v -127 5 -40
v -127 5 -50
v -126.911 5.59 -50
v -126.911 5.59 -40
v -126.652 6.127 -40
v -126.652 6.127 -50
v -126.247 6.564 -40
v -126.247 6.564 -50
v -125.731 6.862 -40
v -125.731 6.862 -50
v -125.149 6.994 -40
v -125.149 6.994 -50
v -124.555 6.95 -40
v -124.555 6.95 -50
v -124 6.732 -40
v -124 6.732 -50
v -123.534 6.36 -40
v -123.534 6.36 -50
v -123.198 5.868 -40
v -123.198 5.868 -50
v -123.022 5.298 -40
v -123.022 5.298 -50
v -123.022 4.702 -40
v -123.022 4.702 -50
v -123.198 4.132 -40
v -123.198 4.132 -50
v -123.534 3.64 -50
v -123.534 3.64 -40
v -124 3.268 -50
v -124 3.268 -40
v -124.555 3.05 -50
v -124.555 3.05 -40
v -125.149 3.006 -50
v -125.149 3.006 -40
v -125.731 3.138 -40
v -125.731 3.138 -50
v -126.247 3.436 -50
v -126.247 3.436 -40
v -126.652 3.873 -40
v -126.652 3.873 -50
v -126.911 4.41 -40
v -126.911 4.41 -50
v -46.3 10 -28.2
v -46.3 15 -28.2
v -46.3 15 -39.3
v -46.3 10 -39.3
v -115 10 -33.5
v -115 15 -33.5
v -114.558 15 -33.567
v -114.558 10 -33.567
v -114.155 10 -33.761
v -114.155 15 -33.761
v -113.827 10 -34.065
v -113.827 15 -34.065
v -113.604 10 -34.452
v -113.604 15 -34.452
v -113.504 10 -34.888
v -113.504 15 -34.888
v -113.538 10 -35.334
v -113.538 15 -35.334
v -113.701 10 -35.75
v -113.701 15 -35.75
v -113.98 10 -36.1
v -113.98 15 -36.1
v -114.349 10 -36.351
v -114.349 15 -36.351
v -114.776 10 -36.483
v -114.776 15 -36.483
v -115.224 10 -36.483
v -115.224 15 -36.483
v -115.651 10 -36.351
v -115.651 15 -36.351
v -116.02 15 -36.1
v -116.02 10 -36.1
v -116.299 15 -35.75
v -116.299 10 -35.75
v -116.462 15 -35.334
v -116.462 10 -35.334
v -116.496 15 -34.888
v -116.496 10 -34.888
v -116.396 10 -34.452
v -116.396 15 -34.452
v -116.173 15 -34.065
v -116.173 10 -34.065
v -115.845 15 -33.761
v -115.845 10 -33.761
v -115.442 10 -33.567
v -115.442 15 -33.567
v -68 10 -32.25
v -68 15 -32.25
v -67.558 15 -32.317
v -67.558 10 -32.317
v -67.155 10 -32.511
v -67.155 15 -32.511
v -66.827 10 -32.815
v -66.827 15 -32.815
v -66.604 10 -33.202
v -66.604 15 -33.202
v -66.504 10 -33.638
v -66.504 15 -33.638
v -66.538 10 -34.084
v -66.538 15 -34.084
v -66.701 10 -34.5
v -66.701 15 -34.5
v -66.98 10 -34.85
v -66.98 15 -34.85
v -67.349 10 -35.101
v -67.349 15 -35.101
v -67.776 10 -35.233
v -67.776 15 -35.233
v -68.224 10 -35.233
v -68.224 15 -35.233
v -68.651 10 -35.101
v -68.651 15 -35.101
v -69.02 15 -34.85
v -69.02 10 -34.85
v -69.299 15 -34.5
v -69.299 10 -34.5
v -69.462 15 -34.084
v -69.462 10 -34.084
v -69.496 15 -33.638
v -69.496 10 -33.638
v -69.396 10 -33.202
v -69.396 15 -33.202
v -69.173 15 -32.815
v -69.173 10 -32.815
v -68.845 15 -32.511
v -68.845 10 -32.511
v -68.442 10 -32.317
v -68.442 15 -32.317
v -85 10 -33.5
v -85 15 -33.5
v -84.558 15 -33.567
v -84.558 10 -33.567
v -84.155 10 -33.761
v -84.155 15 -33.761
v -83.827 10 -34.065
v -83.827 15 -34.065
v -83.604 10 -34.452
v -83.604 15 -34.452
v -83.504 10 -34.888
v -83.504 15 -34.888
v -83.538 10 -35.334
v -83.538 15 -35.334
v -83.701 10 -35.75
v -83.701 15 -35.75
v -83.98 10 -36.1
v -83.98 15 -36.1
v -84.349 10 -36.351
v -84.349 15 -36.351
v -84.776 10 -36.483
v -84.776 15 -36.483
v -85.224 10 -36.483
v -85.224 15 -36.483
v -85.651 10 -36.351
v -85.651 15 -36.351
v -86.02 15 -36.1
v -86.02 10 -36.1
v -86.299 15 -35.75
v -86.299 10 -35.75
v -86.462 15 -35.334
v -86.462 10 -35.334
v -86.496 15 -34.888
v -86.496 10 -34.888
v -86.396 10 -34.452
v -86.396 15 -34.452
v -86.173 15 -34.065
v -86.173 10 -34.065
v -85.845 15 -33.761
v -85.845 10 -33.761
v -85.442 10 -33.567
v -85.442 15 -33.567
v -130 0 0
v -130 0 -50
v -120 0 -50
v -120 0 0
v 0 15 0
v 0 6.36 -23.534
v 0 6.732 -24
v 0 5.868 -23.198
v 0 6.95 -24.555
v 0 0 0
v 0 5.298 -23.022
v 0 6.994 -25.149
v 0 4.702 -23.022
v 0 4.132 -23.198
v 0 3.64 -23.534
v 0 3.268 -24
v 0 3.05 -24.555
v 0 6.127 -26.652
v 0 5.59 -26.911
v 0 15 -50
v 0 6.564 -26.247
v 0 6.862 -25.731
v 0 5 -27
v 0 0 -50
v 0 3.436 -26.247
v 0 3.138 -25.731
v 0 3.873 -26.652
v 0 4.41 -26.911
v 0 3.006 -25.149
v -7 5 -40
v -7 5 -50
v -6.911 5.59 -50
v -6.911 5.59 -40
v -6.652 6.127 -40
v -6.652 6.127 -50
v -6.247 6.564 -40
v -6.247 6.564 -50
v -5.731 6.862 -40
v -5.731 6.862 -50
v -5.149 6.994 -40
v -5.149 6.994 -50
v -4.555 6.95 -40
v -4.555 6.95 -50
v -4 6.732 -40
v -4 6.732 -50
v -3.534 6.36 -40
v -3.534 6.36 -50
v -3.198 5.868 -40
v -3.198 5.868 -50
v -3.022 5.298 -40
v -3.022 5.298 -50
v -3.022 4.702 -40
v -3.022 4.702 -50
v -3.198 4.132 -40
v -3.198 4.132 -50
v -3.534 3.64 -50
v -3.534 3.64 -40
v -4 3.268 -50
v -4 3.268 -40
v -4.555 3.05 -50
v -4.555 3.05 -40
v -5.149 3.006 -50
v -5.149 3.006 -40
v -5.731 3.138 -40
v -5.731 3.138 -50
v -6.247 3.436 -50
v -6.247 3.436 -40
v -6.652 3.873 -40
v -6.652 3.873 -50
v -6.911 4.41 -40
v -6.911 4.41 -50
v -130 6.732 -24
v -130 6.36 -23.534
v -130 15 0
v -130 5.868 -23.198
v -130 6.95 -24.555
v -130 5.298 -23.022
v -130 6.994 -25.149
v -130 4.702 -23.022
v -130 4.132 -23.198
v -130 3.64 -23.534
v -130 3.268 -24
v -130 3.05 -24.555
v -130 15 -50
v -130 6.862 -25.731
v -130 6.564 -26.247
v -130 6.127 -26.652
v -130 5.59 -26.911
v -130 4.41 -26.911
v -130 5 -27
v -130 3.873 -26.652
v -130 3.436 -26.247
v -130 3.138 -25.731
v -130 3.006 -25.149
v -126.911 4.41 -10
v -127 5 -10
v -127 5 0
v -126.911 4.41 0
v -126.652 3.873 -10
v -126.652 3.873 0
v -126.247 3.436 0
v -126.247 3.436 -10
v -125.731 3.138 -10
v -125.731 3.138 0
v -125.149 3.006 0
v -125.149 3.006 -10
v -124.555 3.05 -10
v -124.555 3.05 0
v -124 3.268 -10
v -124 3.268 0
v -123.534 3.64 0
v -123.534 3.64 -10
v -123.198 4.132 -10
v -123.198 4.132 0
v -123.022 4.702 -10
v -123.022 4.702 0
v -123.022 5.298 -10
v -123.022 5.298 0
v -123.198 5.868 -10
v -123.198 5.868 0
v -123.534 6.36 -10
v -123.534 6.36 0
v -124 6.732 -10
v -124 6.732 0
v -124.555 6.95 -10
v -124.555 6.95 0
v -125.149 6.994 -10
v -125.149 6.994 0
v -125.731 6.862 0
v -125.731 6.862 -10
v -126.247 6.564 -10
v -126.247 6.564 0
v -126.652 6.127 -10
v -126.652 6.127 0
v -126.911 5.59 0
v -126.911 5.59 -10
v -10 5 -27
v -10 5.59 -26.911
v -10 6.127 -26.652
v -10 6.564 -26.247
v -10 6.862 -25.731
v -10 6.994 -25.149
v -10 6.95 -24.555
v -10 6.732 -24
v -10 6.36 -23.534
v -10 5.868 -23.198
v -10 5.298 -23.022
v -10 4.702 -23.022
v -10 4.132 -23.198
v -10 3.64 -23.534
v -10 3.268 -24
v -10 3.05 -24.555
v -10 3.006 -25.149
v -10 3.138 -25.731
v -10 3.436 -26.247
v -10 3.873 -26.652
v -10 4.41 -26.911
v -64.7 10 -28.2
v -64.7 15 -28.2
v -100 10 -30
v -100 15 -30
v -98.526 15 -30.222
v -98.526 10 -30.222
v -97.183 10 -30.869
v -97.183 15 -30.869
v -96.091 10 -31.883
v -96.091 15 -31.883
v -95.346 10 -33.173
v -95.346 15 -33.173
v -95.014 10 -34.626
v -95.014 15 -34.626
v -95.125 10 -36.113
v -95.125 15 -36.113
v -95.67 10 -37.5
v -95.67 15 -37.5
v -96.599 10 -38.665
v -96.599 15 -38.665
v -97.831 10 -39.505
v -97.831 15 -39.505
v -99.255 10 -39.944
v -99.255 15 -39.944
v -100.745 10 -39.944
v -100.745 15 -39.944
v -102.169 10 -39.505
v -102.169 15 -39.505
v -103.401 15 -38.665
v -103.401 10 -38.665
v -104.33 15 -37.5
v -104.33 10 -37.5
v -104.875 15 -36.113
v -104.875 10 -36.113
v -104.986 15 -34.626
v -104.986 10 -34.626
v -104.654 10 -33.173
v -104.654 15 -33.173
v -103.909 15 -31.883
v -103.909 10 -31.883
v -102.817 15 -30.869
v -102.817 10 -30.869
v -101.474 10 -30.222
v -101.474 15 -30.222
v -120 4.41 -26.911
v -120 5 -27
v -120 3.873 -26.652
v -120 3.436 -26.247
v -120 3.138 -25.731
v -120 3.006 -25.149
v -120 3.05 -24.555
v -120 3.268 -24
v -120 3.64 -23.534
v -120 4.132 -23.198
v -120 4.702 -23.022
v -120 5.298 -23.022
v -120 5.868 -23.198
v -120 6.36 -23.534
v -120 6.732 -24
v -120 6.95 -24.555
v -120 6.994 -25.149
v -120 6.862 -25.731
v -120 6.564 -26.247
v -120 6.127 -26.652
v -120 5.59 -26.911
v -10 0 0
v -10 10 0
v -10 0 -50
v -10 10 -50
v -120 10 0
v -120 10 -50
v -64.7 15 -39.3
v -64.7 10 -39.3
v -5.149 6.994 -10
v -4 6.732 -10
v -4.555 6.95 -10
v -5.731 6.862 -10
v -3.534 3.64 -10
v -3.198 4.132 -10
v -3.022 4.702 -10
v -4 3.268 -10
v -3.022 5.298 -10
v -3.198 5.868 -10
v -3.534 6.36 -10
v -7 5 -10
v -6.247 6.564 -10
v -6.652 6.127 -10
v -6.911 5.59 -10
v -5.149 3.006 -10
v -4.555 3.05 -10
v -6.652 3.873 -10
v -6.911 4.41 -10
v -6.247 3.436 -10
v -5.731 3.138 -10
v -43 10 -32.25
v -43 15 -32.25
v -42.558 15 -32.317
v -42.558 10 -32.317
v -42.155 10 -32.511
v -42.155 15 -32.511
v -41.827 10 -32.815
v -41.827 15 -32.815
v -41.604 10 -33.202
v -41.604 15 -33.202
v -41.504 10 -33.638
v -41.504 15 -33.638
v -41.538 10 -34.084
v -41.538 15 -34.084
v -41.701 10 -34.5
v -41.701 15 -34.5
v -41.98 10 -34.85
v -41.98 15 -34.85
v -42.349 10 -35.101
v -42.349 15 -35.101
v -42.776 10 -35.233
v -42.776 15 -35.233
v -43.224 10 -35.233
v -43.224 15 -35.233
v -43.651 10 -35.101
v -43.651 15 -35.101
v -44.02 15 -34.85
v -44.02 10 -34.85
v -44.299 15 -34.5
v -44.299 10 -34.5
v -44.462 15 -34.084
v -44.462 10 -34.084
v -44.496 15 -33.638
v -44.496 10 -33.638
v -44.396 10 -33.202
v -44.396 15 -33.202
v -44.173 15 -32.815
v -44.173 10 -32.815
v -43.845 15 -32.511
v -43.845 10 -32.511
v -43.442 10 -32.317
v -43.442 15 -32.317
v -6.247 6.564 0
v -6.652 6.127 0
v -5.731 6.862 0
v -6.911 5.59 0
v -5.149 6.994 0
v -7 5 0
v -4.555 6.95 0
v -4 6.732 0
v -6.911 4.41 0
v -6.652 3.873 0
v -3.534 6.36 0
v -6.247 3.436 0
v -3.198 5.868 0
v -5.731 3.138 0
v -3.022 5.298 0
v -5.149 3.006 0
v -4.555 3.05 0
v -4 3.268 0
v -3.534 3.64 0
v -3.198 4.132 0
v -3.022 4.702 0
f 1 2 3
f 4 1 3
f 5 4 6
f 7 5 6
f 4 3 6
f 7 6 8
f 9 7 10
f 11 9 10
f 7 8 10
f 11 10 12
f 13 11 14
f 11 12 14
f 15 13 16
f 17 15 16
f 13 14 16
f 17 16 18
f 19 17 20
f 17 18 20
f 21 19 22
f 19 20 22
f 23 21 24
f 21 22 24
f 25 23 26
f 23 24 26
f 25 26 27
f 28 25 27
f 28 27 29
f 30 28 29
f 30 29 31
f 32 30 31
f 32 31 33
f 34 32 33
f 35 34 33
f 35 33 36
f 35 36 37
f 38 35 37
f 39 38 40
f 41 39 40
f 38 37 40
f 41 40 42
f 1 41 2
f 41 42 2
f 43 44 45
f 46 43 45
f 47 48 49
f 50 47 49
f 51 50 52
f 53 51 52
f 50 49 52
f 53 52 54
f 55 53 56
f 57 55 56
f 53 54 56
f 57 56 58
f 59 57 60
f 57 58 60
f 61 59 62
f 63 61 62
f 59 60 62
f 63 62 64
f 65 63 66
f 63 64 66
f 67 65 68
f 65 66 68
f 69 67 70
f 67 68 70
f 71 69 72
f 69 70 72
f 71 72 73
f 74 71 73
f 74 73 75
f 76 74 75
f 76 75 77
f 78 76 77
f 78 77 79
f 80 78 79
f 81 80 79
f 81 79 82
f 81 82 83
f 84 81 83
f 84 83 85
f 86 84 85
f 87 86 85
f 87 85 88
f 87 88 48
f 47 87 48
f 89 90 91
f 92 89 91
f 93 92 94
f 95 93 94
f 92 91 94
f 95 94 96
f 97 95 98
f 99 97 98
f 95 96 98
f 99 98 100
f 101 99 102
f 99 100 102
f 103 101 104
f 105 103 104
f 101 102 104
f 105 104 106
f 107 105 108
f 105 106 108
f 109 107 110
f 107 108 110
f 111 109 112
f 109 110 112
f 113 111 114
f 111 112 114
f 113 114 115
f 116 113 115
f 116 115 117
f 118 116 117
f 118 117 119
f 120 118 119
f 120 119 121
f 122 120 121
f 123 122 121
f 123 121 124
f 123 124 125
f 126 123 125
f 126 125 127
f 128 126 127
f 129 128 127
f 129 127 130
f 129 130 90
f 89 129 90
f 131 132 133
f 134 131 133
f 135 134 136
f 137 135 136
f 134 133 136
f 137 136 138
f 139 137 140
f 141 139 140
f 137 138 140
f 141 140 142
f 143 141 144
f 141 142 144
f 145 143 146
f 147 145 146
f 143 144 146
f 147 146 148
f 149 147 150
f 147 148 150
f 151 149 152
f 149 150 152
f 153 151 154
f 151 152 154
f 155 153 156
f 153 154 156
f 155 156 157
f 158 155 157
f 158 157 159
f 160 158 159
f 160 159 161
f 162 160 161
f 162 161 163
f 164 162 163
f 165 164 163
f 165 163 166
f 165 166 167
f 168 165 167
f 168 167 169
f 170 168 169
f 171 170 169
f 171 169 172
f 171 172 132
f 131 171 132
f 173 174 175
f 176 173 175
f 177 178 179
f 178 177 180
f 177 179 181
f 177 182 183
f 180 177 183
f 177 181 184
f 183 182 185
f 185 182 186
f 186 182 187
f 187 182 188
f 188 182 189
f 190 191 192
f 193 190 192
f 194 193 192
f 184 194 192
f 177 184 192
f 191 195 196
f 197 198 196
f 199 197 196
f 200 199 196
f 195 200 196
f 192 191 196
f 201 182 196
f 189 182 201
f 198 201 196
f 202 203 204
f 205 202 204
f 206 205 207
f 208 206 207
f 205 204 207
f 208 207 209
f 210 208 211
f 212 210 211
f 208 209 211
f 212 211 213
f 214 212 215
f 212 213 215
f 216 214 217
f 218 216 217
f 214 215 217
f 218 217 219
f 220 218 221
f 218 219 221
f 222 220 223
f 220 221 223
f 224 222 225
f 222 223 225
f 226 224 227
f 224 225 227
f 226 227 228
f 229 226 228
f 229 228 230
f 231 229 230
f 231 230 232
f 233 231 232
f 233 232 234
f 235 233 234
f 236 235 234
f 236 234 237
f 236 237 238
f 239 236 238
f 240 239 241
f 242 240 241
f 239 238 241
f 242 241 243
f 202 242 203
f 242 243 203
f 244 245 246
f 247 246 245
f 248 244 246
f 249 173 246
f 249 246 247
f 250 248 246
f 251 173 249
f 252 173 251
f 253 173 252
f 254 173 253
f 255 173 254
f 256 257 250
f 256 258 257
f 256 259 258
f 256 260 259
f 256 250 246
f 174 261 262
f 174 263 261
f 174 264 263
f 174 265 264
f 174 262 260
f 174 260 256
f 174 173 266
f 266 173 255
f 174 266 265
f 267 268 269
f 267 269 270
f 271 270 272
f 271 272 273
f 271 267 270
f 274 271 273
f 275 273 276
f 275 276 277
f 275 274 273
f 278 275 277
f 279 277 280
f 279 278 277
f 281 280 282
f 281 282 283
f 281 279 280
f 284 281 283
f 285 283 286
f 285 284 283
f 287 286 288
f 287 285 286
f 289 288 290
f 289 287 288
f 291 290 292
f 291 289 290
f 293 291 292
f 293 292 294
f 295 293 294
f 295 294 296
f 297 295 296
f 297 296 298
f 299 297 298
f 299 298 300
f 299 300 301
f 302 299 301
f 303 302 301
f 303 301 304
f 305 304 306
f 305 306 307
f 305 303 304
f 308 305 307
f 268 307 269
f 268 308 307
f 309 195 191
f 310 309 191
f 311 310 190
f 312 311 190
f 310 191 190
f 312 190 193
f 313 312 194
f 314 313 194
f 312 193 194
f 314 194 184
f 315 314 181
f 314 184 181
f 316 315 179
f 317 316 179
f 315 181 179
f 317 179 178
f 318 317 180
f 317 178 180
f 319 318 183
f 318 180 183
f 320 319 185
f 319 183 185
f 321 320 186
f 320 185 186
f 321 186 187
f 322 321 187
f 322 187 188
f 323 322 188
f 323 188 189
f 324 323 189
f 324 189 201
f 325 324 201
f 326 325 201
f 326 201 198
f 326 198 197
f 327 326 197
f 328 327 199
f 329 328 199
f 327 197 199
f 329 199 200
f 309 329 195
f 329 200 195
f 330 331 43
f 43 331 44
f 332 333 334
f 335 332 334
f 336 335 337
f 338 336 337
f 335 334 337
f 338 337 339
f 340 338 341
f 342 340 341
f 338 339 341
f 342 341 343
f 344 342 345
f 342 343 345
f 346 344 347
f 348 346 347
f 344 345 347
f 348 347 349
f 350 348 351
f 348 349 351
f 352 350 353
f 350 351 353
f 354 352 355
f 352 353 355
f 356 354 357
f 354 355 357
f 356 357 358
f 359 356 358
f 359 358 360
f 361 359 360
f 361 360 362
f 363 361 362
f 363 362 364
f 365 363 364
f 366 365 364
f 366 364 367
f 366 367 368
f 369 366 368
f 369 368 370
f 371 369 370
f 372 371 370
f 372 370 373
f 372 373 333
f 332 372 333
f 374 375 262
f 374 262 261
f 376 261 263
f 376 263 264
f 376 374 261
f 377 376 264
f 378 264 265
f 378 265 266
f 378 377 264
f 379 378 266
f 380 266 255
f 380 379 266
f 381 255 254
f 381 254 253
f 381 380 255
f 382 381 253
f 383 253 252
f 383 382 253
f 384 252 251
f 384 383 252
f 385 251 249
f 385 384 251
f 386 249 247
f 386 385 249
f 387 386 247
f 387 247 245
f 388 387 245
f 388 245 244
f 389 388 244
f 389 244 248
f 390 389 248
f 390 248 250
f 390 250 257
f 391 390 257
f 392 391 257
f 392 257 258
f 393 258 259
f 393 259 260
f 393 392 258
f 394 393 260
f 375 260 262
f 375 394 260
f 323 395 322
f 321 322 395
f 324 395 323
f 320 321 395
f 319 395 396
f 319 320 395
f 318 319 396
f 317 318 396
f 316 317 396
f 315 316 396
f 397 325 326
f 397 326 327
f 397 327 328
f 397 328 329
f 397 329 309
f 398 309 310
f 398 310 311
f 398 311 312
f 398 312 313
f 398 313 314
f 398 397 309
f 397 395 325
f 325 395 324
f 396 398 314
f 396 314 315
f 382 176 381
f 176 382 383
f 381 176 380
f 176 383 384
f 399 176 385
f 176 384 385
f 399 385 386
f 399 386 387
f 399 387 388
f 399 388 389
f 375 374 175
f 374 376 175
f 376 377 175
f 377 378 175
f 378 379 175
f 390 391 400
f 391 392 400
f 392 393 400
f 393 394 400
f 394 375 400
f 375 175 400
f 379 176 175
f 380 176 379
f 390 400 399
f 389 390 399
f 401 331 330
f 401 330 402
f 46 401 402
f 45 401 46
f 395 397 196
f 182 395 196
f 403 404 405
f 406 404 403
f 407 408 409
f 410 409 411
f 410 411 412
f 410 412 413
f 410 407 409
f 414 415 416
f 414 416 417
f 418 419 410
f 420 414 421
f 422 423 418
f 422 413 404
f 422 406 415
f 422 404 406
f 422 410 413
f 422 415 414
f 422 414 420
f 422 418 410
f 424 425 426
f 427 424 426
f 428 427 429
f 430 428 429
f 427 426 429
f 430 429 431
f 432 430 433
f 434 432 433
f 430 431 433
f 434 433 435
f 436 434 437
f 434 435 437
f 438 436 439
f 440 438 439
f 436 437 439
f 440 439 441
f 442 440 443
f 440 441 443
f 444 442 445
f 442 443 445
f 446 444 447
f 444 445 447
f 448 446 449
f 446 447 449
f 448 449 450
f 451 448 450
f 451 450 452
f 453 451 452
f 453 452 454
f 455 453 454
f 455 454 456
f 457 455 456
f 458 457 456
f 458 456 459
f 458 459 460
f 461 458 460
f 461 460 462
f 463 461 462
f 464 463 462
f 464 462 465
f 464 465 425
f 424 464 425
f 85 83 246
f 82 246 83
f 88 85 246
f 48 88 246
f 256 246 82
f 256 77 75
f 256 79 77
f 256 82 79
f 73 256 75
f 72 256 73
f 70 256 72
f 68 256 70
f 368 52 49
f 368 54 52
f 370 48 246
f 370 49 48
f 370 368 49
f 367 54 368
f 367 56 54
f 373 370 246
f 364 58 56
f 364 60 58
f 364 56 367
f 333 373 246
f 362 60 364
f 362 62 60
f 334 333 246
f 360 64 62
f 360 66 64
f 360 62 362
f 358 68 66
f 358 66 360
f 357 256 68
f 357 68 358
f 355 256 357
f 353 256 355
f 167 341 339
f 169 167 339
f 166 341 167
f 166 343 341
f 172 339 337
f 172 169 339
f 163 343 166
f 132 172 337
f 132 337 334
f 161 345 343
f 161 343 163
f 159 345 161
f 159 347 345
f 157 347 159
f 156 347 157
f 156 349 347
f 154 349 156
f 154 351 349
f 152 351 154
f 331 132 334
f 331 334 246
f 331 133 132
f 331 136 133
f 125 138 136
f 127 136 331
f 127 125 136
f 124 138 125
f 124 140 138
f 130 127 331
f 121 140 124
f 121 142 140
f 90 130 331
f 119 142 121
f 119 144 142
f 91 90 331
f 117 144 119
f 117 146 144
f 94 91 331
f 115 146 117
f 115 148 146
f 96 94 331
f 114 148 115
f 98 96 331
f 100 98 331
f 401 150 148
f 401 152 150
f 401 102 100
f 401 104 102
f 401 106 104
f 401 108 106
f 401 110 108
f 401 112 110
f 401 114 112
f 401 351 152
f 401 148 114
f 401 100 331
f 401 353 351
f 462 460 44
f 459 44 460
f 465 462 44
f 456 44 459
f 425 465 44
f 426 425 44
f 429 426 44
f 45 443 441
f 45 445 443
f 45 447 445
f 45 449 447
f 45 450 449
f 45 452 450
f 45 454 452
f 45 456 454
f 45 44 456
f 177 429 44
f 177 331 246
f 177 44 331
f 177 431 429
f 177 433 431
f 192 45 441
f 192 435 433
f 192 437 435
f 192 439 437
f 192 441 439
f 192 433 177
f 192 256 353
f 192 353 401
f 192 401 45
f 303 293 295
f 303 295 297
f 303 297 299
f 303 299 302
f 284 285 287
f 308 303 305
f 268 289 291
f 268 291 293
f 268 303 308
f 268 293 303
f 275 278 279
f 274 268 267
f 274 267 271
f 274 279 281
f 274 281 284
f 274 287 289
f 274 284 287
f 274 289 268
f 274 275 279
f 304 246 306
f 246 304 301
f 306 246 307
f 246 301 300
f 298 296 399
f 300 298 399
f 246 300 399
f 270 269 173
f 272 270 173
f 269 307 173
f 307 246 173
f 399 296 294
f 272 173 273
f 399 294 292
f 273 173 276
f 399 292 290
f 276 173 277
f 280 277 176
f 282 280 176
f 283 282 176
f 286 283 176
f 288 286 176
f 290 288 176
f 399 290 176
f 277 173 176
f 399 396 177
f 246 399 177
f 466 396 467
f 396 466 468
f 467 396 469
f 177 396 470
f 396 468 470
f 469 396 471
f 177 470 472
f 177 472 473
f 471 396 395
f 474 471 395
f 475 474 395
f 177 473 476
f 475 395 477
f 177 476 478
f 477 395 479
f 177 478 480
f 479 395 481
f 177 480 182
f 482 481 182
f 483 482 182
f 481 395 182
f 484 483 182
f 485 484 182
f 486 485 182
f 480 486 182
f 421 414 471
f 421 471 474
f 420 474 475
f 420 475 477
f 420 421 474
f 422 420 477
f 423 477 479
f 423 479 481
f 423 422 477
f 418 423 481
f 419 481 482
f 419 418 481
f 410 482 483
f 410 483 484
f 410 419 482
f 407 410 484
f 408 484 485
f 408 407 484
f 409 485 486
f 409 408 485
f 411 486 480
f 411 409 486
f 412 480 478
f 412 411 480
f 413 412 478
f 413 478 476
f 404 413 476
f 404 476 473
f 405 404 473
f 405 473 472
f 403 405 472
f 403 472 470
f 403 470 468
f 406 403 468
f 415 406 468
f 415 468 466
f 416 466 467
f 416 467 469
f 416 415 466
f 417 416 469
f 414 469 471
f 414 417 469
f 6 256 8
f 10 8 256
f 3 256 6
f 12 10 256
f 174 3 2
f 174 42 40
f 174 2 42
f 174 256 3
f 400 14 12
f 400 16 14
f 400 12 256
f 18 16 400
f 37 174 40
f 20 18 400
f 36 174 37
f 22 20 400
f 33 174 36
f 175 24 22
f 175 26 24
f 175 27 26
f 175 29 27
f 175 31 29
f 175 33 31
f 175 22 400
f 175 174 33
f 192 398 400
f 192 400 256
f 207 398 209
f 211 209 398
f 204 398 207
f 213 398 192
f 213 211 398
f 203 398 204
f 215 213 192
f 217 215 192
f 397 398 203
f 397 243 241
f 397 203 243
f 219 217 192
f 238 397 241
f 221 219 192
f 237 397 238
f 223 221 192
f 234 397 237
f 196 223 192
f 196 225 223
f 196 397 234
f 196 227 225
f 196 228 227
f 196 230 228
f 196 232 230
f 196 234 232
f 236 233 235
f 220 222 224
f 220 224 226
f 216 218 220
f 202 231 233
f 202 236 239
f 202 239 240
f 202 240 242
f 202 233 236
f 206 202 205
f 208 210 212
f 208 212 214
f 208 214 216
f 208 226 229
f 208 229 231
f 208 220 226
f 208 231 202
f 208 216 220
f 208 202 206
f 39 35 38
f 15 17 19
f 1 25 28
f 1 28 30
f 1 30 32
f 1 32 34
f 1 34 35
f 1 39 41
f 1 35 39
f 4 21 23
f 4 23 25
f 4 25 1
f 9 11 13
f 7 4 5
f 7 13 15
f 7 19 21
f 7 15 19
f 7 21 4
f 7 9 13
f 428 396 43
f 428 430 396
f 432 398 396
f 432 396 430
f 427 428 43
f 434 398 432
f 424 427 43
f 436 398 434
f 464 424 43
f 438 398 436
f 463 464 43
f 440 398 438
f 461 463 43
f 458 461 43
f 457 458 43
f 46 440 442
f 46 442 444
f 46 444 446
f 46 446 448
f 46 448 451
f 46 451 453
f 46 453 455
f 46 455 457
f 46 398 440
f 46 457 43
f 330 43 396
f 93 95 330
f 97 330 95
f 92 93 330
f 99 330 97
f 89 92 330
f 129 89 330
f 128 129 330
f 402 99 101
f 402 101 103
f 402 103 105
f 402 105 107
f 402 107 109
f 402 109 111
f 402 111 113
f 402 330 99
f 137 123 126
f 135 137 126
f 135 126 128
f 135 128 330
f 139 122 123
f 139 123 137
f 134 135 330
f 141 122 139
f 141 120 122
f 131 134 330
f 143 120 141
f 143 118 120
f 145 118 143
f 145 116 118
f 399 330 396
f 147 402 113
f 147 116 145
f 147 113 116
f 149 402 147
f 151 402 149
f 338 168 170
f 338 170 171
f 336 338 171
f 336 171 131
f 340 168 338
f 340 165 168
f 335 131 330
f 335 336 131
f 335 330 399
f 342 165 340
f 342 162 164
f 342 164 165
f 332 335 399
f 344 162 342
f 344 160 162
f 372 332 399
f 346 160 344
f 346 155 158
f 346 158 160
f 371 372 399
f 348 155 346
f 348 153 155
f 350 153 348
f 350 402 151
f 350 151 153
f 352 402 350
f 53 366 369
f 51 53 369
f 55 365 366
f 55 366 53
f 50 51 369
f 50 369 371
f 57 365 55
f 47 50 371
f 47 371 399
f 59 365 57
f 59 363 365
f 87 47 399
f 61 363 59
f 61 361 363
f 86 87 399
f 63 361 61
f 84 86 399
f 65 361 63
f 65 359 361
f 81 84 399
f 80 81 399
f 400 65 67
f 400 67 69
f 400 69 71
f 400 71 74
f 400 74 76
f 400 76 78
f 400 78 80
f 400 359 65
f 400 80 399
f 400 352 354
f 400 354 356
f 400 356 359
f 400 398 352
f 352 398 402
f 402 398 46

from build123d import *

# Parameters (mm, degrees)
ESBO_O1_W                = 130
ESBO_O1_H                = 50
RESSALTO_EXTRUS_O1_DEPTH = 15
ESBO_O2_W                = 110
ESBO_O2_H                = 10
CORTE_EXTRUS_O1_DEPTH    = 51
ESBO_O5_R                = 2
CORTE_EXTRUS_O2_DEPTH    = 10
CORTE_EXTRUS_O3_START    = -10
ESBO_O6_R                = 2
CORTE_EXTRUS_O3_DEPTH    = 10
ESBO_O7_R                = 2
CORTE_EXTRUS_O4_DEPTH    = 10
CORTE_EXTRUS_O5_START    = -10
ESBO_O8_R                = 2
CORTE_EXTRUS_O5_DEPTH    = 10
ESBO_O13_R               = 1.5
ESBO_O13_R_2             = 5
CORTE_EXTRUS_O8_DEPTH    = 10
ESBO_O14_R               = 1.5
ESBO_O14_W               = 18.4
ESBO_O14_H               = 11.1
CORTE_EXTRUS_O9_DEPTH    = 10


with BuildPart() as part:
    # Esboço1 → Ressalto-extrusão1 (new body)
    with BuildSketch(Plane(origin=(0, 0, 0), x_dir=(1, 0, 0), z_dir=(0, 1, 0))):
        with Locations((-65, 25)):
            Rectangle(ESBO_O1_W, ESBO_O1_H)
    extrude(amount=RESSALTO_EXTRUS_O1_DEPTH)

    # Esboço2 → Corte-extrusão1 (cut)
    with BuildSketch(Plane(origin=(0, 0, -50), x_dir=(-1, 0, 0), z_dir=(0, 0, -1))):
        with Locations((65, 5)):
            Rectangle(ESBO_O2_W, ESBO_O2_H)
    extrude(amount=-CORTE_EXTRUS_O1_DEPTH, mode=Mode.SUBTRACT)

    # Esboço5 → Corte-extrusão2 (cut)
    with BuildSketch(Plane(origin=(0, 0, -50), x_dir=(-1, 0, 0), z_dir=(0, 0, -1))):
        with Locations((125, 5)):
            Circle(ESBO_O5_R)
        with Locations((5, 5)):
            Circle(ESBO_O5_R)
    extrude(amount=-CORTE_EXTRUS_O2_DEPTH, mode=Mode.SUBTRACT)

    # Esboço6 → Corte-extrusão3 (cut)
    with BuildSketch(Plane.XY.offset(CORTE_EXTRUS_O3_START)):
        with Locations(Location((-125, 5, 0), (0, 0, 180))):
            Circle(ESBO_O6_R)
        with Locations(Location((-5, 5, 0), (0, 0, 180))):
            Circle(ESBO_O6_R)
    extrude(amount=CORTE_EXTRUS_O3_DEPTH, mode=Mode.SUBTRACT)

    # Esboço7 → Corte-extrusão4 (cut)
    with BuildSketch(Plane(origin=(0, 0, 0), x_dir=(0, 0, -1), z_dir=(1, 0, 0))):
        with Locations((25, 5)):
            Circle(ESBO_O7_R)
    extrude(amount=-CORTE_EXTRUS_O4_DEPTH, mode=Mode.SUBTRACT)

    # Esboço8 → Corte-extrusão5 (cut)
    with BuildSketch(Plane.ZY.offset(130).offset(CORTE_EXTRUS_O5_START)):
        with Locations(Location((-25, 5, 0), (0, 0, 180))):
            Circle(ESBO_O8_R)
    extrude(amount=CORTE_EXTRUS_O5_DEPTH, mode=Mode.SUBTRACT)

    # Esboço13 → Corte-extrusão8 (cut)
    with BuildSketch(Plane(origin=(0, 15, 0), x_dir=(1, 0, 0), z_dir=(0, 1, 0))):
        with Locations(Location((-115, 35, 0), (0, 0, 270))):
            Circle(ESBO_O13_R)
        with Locations(Location((-100, 35, 0), (0, 0, 270))):
            Circle(ESBO_O13_R_2)
        with Locations(Location((-85, 35, 0), (0, 0, 270))):
            Circle(ESBO_O13_R)
    extrude(amount=-CORTE_EXTRUS_O8_DEPTH, mode=Mode.SUBTRACT)

    # Esboço14 → Corte-extrusão9 (cut)
    with BuildSketch(Plane(origin=(0, 15, 0), x_dir=(1, 0, 0), z_dir=(0, 1, 0))):
        with Locations(Location((-68, 33.75, 0), (0, 0, 270))):
            Circle(ESBO_O14_R)
        with Locations(Location((-43, 33.75, 0), (0, 0, 270))):
            Circle(ESBO_O14_R)
        with Locations((-55.5, 33.75)):
            Rectangle(ESBO_O14_W, ESBO_O14_H)
    extrude(amount=-CORTE_EXTRUS_O9_DEPTH, mode=Mode.SUBTRACT)


solid = part.part
